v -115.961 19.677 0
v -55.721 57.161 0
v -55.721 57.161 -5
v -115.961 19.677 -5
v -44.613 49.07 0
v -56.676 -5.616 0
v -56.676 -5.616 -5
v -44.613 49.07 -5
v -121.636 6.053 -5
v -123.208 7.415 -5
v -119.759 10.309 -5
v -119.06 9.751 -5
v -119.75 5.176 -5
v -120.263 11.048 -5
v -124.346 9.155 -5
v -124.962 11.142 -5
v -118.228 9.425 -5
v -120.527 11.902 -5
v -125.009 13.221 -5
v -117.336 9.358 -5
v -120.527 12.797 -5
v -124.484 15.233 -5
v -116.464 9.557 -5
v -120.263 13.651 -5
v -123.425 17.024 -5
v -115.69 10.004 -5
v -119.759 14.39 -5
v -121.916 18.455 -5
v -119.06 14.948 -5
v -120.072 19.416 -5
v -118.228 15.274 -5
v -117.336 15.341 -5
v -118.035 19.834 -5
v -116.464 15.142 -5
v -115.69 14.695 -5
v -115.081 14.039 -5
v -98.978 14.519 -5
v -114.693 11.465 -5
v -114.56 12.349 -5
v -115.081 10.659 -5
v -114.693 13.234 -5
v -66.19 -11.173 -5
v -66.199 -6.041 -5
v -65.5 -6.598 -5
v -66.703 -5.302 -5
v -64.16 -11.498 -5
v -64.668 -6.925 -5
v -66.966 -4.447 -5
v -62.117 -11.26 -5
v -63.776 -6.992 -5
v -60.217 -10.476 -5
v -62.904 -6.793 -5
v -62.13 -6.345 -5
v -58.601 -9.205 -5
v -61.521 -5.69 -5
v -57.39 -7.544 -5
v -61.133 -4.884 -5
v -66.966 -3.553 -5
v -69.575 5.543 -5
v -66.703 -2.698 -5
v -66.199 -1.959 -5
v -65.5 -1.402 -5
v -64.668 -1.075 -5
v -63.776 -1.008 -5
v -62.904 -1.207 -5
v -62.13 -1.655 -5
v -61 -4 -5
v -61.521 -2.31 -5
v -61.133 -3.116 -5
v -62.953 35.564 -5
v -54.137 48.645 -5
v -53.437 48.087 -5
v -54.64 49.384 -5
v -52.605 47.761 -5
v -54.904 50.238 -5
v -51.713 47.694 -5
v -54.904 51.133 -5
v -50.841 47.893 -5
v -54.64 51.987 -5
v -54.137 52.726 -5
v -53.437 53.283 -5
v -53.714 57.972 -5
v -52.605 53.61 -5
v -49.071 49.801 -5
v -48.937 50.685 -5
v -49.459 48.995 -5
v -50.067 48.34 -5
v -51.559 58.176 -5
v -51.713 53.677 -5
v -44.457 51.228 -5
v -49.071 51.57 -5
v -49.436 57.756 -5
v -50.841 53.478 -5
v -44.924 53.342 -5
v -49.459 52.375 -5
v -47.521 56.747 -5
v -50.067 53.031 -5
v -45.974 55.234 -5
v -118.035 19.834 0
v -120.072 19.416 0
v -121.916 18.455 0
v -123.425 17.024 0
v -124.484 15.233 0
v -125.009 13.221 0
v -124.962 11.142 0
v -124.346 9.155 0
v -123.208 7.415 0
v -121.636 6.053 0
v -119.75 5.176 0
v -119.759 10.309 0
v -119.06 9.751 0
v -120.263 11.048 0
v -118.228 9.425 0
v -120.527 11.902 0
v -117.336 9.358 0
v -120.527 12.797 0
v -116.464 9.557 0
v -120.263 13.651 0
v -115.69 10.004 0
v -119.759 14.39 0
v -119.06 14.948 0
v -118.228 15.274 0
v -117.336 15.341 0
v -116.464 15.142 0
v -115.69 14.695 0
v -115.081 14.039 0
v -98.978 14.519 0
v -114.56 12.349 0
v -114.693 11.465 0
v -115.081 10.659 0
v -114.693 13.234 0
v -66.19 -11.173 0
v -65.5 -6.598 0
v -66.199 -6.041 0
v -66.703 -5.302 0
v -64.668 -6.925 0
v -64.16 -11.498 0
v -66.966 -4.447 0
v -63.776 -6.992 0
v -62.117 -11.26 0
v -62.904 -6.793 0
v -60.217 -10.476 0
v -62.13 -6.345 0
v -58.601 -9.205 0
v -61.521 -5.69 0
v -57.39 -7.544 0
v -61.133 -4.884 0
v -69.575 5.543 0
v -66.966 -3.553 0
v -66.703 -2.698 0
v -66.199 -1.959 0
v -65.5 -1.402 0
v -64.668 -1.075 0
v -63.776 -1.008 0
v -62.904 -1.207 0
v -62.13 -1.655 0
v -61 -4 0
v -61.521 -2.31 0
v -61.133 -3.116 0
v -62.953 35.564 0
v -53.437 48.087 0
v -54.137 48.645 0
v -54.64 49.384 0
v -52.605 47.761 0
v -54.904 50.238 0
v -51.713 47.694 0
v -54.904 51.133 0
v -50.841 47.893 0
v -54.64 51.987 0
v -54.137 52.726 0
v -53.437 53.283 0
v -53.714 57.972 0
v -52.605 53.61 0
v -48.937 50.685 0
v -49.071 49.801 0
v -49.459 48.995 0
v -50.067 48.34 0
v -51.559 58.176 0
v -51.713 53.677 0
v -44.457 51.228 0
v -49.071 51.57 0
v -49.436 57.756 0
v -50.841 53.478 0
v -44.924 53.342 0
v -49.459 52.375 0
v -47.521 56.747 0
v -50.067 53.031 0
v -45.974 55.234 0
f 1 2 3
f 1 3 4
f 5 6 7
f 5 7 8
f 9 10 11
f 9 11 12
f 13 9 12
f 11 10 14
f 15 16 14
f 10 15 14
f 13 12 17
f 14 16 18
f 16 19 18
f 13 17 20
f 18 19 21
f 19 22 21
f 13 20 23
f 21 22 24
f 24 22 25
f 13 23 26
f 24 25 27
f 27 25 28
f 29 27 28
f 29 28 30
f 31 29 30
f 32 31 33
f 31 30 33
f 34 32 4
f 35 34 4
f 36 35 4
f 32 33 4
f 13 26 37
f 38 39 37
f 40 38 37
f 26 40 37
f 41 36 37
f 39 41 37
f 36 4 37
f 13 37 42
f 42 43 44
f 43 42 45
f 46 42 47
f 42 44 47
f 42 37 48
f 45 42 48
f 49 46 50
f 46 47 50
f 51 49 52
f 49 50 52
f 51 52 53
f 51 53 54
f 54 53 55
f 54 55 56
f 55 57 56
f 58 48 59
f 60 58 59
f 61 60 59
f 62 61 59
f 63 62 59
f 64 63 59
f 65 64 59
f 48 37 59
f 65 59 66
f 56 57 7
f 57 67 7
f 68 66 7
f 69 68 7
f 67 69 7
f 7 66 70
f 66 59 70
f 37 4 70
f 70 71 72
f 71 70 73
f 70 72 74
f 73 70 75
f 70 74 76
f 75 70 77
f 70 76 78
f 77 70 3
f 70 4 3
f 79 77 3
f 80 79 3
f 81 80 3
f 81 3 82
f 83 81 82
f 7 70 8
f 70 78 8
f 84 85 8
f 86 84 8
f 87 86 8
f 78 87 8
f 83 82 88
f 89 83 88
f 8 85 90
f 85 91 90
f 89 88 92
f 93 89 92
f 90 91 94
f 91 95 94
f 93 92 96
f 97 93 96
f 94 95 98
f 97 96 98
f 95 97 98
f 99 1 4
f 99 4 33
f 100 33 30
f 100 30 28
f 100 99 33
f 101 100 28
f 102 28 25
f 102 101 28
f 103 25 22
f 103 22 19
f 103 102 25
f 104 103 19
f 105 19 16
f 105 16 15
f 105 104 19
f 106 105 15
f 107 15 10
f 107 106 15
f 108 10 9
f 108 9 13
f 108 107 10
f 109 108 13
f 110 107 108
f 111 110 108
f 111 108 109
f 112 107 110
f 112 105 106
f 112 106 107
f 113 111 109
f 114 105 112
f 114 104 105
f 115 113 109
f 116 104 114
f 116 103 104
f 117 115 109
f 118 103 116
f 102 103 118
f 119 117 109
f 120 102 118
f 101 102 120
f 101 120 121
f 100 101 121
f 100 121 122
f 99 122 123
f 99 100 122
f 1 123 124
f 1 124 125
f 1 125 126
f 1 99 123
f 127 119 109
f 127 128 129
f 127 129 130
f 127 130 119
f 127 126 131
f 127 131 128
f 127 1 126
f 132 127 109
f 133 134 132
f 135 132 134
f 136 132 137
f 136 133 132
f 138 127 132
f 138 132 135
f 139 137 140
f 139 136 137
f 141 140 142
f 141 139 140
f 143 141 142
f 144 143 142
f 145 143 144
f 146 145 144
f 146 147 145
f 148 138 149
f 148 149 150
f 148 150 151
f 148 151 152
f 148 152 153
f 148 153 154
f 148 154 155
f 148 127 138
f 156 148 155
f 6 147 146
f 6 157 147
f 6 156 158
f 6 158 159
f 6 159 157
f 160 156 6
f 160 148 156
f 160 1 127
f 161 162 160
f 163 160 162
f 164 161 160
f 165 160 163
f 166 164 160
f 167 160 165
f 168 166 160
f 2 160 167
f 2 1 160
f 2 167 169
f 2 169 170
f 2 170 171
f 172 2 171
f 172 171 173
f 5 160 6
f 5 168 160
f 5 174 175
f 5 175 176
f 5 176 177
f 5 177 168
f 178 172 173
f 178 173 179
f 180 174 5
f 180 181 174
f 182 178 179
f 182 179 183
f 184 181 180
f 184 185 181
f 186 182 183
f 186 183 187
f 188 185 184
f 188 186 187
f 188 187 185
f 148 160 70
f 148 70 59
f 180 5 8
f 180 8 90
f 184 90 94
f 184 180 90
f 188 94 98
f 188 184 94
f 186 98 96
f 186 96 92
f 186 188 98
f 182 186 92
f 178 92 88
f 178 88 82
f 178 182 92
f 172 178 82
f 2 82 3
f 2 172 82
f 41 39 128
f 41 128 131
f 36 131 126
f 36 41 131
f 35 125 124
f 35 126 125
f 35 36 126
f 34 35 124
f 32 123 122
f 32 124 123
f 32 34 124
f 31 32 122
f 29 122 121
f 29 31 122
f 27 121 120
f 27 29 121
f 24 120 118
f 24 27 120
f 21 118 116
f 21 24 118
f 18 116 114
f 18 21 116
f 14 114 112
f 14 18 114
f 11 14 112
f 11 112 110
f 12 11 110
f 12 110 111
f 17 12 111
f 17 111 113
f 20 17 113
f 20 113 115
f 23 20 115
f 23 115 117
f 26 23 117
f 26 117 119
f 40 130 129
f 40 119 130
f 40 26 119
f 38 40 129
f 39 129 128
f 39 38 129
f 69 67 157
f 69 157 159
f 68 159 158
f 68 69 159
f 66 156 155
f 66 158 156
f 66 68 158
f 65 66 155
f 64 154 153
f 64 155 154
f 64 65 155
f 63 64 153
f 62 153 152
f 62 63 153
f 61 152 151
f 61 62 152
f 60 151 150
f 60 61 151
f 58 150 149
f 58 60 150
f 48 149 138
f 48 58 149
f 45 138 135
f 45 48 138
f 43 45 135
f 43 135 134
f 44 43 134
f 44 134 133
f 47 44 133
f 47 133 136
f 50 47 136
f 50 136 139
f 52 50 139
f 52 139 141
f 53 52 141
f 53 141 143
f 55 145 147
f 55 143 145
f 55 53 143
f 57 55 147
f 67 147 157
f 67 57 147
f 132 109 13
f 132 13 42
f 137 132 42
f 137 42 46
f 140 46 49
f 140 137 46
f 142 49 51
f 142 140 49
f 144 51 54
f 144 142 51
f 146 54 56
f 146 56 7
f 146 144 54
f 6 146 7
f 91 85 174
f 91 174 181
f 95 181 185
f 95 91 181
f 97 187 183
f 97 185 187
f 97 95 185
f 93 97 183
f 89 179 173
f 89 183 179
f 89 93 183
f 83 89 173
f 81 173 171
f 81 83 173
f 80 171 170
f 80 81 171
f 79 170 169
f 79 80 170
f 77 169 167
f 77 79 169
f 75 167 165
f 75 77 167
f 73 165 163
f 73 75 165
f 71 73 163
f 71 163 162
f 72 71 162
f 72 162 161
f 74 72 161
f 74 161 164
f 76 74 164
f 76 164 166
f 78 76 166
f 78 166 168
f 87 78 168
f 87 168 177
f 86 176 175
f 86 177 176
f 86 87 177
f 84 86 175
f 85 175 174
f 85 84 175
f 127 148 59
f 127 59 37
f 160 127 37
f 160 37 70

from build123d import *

# Parameters (mm, degrees)
BOSS_EXTRU_1_DEPTH           = 5
ENL_V_MAT_EXTRU_1_DEPTH      = 139.023902146
ENL_V_MAT_EXTRU_1_DEPTH_BACK = 139.023902146
ESQUISSE2_R                  = 3


with BuildPart() as part:
    # Esquisse1 → Boss.-Extru.1 (new body)
    with BuildSketch(Plane.XY):
        with BuildLine():
            Line((-56.676061624, -5.615526744), (-44.613461935, 49.069879799))
            ThreePointArc((-44.613461935, 49.069879799), (-47.521267958, 56.747400855), (-55.720555636, 57.161341672))
            Line((-55.720555636, 57.161341672), (-115.960936395, 19.676937291))
            ThreePointArc((-115.960936395, 19.676937291), (-124.816589866, 14.245466781), (-119.749865766, 5.176190229))
            Line((-119.749865766, 5.176190229), (-66.18965615, -11.173242359))
            ThreePointArc((-66.18965615, -11.173242359), (-60.216844676, -10.475935129), (-56.676061624, -5.615526744))
        make_face()
        Polygon((-62.953169806, 35.564136013), (-69.575176268, 5.543483348), (-98.978129472, 14.518832861), align=None, mode=Mode.SUBTRACT)
    extrude(amount=-BOSS_EXTRU_1_DEPTH)

    # Esquisse2 → Enlèv. mat.-Extru.1 (cut, two sides: drawn at the far end of the back side and taken through both)
    with BuildSketch(Plane.XY.offset(-ENL_V_MAT_EXTRU_1_DEPTH_BACK)):
        with Locations((-117.560209615, 12.349432588)):
            Circle(ESQUISSE2_R)
        with Locations((-64, -4)):
            Circle(ESQUISSE2_R)
        with Locations((-51.937400312, 50.685406543)):
            Circle(ESQUISSE2_R)
    extrude(amount=ENL_V_MAT_EXTRU_1_DEPTH + ENL_V_MAT_EXTRU_1_DEPTH_BACK, mode=Mode.SUBTRACT)


solid = part.part
